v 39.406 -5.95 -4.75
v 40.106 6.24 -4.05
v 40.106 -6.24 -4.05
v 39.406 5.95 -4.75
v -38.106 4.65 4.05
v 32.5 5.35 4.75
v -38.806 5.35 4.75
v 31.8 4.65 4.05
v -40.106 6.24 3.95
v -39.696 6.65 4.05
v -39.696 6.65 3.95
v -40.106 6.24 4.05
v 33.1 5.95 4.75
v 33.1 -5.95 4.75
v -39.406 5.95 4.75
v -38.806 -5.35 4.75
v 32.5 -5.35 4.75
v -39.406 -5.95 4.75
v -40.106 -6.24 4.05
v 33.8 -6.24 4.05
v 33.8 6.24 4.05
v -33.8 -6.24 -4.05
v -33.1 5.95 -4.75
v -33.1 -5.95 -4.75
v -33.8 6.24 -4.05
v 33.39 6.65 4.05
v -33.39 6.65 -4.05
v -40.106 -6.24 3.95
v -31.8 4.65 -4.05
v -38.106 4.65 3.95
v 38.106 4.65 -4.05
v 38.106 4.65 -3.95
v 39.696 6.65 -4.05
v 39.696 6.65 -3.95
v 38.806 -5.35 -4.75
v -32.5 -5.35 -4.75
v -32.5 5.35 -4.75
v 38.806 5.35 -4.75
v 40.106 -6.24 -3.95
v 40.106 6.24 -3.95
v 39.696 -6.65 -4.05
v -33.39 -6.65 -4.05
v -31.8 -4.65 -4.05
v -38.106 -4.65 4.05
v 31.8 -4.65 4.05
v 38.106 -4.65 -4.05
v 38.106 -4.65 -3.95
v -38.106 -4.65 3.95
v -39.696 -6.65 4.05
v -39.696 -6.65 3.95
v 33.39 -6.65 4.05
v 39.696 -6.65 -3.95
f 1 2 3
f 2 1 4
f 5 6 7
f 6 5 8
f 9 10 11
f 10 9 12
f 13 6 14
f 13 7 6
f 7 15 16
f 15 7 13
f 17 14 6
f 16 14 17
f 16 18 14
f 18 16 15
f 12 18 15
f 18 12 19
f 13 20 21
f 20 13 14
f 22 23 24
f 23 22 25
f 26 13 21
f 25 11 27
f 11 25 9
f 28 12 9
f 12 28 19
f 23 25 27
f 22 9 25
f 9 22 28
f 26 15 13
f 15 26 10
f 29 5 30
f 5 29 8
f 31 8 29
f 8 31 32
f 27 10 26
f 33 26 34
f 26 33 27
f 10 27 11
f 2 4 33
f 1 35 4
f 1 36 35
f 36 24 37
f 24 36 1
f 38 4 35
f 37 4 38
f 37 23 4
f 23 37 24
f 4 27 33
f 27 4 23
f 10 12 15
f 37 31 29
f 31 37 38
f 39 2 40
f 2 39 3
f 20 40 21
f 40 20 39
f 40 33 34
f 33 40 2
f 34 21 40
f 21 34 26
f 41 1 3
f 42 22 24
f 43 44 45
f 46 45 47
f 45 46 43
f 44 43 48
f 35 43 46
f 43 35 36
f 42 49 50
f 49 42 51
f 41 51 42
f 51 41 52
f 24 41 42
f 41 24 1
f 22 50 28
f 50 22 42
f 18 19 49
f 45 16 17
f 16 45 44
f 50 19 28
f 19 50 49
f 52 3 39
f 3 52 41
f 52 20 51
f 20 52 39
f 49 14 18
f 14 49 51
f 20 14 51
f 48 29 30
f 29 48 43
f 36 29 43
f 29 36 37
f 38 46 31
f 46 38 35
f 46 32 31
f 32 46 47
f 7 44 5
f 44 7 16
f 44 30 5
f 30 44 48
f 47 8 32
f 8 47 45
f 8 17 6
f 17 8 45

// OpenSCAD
// Title: Micro Wallet
// Author: http://www.thingiverse.com/Jinja
// Date: 14/9/2013

/////////// START OF PARAMETERS /////////////////

// The more cards you carry, the bigger this should be. This is the only thing you really need to change.
inner_thickness = 10;

// Percentage to increase wall thickness
increase_wall = 0; // [0:100]

// The inner width. This is the width of the clip in the unlocked position.
inner_width = 65; // [60:80]

// The height of the wallet
height = 8; //[6:30]

// The width of your credit cards. You only need to change this if you plan to use the holder for something other than credit cards.
card_width = 56;

/////////// END OF PARAMETERS /////////////////
rounded = 0.7*1;
overhang=45*1;

$fs=0.3*1;
//$fa=5*1; //smooth
$fa=8*1; //nearly smooth
//$fa=20*1; //rough

x = inner_width*1;
y = height*1;
r = sqrt((x*x)+(y*y));
cc = card_width*1;
a = asin(cc/r);
b = acos(x/r);
c = (a-b);
new_length = cc/sin(c);
additional = new_length-x;

wall_thickness2 = 2 * (1+(increase_wall/100));
wall_thickness = wall_thickness2-(2*rounded);
height2 = height-wall_thickness2;

minkowski()
{
difference()
{
	wedge( additional+new_length+2*wall_thickness, new_length+2*wall_thickness, (inner_thickness+rounded)+2*wall_thickness, height );

	wedge( additional+new_length, new_length, (inner_thickness+rounded), height );
}

diamond(rounded);
}

module wedge( length, length2, thickness, height )
{
	hull()
	{
		translate([(-length+length2)*0.5,0,height*0.5])
		cube( [length2, thickness, 0.1], true );

		translate([(length-length2)*0.5,0,-height*0.5])
		cube( [length2, thickness, 0.1], true );
	}
}



module bar( length, diam1, diam2, height )
{
	hull()
	{
		translate( [-length*0.5, 0, -height*0.5] )
		cylinder( height, diam1*0.5, diam2*0.5 );
		translate( [length*0.5, 0, -height*0.5] )
		cylinder( height, diam1*0.5, diam2*0.5 );
	}
}

module cutter(dist, overhang)
{
	size = dist*2;

	translate([dist,-dist,-dist])
	cube([size,size,size]);

	translate([-dist-size,-dist,-dist])
	cube([size,size,size]);

	translate([dist,-dist,0])
	rotate([0,-overhang,0])
	cube([size,size,size]);

	translate([-dist,-dist,0])
	rotate([0,-90+overhang,0])
	cube([size,size,size]);

	translate([dist,-dist,0])
	rotate([0,90+overhang,0])
	cube([size,size,size]);

	translate([-dist,-dist,0])
	rotate([0,180-overhang,0])
	cube([size,size,size]);

}

module diamond( rounded )
{
	dist = rounded;
	difference()
	{
		cube([2*rounded,2*rounded,2*rounded], true);
		for(i=[0:45:179])
		{
			rotate([0,0,i])
			cutter(dist, overhang);
		}
	}
}
